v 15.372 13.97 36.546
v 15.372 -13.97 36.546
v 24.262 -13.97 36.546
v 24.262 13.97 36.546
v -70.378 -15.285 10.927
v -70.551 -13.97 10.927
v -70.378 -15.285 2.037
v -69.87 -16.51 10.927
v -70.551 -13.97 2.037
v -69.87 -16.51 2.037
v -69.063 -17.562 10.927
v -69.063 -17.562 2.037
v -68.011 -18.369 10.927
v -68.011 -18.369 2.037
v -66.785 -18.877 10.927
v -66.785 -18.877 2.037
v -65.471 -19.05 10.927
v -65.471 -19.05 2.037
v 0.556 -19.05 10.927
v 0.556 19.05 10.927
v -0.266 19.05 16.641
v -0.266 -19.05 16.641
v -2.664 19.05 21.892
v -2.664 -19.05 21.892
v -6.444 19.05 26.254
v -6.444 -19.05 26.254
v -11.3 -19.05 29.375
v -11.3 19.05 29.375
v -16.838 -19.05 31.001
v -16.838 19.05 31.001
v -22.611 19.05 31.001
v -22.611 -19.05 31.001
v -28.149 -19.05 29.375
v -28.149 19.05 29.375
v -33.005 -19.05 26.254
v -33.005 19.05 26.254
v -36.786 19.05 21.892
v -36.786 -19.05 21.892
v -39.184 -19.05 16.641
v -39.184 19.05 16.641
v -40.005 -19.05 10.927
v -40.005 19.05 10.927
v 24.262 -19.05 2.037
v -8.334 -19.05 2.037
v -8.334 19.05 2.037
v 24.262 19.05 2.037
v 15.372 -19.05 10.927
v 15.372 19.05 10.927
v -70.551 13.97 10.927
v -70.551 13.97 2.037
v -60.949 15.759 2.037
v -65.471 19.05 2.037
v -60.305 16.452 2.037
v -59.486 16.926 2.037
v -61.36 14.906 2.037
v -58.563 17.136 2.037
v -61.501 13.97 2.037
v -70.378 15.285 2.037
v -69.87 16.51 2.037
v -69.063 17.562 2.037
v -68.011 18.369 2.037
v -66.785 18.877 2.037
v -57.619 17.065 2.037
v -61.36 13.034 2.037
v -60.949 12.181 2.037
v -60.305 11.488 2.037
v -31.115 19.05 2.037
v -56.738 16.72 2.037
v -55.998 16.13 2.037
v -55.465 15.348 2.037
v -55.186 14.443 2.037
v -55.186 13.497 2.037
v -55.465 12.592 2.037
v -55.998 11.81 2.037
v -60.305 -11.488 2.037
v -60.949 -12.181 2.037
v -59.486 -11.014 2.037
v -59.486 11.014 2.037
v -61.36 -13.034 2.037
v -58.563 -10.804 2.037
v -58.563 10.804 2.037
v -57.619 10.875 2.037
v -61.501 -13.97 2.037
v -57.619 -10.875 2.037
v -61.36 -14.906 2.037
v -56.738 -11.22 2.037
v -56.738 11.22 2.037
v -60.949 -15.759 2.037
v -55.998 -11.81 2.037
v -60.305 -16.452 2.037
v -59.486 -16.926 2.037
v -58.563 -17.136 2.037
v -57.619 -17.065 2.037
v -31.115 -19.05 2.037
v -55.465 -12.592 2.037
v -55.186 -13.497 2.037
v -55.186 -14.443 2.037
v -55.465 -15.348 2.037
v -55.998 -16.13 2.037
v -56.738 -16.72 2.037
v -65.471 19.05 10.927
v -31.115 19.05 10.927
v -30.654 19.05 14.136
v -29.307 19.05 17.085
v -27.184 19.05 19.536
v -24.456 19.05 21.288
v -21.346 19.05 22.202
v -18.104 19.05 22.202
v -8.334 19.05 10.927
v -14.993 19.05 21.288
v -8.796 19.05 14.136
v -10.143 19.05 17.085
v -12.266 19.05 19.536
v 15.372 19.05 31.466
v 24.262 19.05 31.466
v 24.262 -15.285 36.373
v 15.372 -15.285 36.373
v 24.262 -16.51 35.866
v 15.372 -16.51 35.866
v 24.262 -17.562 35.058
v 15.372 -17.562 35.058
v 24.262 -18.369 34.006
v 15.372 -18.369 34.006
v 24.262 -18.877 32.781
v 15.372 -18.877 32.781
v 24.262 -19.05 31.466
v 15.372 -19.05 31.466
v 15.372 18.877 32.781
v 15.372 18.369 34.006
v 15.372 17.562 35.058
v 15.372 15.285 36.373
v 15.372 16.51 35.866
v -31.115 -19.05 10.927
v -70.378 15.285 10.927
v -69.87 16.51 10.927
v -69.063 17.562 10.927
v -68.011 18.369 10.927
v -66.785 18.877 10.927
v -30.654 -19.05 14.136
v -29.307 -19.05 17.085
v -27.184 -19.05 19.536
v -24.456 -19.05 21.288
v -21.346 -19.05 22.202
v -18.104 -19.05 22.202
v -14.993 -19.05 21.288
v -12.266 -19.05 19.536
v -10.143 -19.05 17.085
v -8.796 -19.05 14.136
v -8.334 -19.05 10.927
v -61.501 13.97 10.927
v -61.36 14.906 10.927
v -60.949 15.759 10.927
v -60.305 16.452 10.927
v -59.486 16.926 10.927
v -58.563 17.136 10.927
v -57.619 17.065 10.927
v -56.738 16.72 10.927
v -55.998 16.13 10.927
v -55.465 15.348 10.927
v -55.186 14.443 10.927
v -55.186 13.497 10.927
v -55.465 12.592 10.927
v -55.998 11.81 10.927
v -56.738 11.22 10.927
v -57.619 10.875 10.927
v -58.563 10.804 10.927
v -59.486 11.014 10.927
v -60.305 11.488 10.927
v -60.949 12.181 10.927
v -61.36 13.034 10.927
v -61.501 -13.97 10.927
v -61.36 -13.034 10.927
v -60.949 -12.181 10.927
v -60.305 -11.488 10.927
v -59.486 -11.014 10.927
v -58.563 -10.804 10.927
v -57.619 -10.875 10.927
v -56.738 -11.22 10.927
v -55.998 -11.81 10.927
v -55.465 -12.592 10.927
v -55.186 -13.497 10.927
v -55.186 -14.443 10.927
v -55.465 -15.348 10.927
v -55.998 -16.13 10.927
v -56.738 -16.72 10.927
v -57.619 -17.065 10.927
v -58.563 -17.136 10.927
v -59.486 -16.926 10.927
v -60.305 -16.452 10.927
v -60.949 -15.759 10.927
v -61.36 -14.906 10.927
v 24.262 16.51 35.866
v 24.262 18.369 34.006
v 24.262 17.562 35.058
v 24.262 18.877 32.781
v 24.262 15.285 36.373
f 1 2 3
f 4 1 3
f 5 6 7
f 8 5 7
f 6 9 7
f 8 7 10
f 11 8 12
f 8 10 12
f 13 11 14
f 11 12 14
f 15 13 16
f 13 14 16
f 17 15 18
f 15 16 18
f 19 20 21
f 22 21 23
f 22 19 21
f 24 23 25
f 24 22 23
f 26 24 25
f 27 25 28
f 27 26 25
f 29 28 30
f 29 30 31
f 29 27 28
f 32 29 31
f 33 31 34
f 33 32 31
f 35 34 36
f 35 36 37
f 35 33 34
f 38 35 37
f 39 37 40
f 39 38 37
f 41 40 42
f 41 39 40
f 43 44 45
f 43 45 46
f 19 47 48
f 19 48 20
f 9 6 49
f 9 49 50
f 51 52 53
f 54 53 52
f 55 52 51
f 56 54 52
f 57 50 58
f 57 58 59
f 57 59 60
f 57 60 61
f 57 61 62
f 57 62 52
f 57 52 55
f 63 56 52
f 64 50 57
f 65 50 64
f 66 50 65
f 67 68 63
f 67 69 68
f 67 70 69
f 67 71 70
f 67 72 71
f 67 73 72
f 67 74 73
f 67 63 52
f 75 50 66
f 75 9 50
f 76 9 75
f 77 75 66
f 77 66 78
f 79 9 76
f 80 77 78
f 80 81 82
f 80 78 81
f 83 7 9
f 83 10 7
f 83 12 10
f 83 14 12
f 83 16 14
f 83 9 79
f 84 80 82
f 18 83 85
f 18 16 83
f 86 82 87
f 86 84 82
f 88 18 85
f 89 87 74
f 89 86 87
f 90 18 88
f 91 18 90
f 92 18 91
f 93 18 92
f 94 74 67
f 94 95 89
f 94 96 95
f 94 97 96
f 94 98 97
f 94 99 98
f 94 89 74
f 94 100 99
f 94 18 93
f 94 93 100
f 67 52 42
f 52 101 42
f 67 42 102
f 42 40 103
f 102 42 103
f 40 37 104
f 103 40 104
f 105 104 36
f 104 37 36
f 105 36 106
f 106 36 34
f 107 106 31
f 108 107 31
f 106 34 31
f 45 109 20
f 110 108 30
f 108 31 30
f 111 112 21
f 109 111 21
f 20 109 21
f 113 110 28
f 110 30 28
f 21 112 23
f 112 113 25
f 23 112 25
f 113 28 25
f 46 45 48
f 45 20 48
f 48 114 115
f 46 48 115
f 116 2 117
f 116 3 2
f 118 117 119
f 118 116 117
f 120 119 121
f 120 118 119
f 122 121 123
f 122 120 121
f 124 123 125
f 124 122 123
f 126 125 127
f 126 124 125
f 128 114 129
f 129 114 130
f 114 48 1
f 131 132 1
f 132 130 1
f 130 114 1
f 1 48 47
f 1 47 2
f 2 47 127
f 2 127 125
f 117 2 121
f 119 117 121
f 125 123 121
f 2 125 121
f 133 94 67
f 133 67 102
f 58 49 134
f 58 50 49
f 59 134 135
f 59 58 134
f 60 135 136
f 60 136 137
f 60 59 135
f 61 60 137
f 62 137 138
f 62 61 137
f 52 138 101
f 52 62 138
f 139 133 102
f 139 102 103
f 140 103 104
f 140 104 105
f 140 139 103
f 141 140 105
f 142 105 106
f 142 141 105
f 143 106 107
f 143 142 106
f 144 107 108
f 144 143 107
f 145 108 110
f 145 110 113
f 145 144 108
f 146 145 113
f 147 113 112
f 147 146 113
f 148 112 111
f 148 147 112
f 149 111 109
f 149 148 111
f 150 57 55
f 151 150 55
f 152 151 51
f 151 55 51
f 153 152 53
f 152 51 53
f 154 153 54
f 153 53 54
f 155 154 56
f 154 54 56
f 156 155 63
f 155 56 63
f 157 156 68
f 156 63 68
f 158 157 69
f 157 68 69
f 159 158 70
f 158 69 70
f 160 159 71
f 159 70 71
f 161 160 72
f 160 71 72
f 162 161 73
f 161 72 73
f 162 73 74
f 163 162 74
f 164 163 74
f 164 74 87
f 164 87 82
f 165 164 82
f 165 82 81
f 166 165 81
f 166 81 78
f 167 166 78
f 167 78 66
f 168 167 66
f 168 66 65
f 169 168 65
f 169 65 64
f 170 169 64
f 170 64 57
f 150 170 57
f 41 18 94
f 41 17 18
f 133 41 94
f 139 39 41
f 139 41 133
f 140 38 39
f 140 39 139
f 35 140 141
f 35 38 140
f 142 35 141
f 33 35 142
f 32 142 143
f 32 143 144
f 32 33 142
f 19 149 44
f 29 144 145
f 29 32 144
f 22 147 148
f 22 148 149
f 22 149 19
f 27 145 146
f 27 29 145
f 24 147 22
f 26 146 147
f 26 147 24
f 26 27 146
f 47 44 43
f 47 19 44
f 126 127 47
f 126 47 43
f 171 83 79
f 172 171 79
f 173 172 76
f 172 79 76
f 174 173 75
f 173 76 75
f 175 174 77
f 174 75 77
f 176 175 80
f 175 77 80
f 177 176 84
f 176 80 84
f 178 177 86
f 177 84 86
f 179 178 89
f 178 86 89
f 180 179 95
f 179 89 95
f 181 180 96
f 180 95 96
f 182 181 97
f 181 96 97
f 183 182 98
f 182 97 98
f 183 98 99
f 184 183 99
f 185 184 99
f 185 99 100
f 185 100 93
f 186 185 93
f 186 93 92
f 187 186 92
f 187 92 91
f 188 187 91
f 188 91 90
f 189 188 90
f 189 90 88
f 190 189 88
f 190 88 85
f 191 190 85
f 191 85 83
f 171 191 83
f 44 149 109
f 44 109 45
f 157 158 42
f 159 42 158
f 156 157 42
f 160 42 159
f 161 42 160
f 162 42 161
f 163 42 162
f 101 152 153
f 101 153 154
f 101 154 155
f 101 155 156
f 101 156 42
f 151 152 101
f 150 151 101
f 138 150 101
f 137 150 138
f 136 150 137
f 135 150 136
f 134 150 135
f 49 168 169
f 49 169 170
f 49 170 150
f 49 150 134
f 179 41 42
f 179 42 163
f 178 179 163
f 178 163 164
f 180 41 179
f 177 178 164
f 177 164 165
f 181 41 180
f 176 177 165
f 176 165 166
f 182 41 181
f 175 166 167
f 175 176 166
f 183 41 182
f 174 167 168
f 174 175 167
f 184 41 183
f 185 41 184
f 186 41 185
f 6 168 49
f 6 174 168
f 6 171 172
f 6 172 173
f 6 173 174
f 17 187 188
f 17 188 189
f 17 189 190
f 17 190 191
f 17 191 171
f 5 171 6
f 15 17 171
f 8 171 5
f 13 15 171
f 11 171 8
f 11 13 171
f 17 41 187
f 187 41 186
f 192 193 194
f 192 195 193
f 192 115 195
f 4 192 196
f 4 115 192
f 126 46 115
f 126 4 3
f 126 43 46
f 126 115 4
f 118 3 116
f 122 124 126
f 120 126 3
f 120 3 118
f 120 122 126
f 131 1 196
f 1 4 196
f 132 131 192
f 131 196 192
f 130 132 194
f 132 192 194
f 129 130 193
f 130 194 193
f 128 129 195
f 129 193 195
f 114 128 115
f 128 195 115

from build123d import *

# Parameters (mm, degrees)
F0_W     = 8.89
F0_H     = 25.618968
F1_DEPTH = 19.05
F2_R     = 5.08
F4_D     = 6.35


with BuildPart() as f1:
    # F0 (on Front) → F1 (new body, symmetric)
    with BuildSketch(Plane.XZ):
        Polygon((-70.550688, 2.037292), (-31.114999, 2.037292), (-31.114999, 10.927292), (-40.004999, 10.927292), (-70.550688, 10.927292), align=None)
        Polygon((0.555625, 10.927292), (-8.334375, 10.927292), (-8.334375, 2.037292), (24.262293, 2.037292), (24.262293, 10.927292), (15.372293, 10.927292), align=None)
        with BuildLine():
            Line((-40.004999, 10.927292), (-31.114999, 10.927292))
            ThreePointArc((-31.114999, 10.927292), (-19.724687, 22.317604), (-8.334375, 10.927292))
            Line((-8.334375, 10.927292), (0.555625, 10.927292))
            ThreePointArc((0.555625, 10.927292), (-19.724687, 31.207604), (-40.004999, 10.927292))
        make_face()
        with Locations((19.817293, 23.736776)):
            Rectangle(F0_W, F0_H)
    extrude(amount=F1_DEPTH, both=True)

    # F2
    f2_edges = [f1.edges().sort_by_distance(p)[0] for p in [
        (-70.550688, -19.05, 6.482292),
        (-70.550688, 19.05, 6.482292),
        (19.817293, -19.05, 36.54626),
        (19.817293, 19.05, 36.54626),
    ]]
    fillet(f2_edges, radius=F2_R)

    # F4 (through all)
    with Locations(Plane.XY.offset(10.927292)):
        with Locations((-58.325827, 13.97), (-58.325827, -13.97)):
            Hole(F4_D / 2)


solid = f1.part
